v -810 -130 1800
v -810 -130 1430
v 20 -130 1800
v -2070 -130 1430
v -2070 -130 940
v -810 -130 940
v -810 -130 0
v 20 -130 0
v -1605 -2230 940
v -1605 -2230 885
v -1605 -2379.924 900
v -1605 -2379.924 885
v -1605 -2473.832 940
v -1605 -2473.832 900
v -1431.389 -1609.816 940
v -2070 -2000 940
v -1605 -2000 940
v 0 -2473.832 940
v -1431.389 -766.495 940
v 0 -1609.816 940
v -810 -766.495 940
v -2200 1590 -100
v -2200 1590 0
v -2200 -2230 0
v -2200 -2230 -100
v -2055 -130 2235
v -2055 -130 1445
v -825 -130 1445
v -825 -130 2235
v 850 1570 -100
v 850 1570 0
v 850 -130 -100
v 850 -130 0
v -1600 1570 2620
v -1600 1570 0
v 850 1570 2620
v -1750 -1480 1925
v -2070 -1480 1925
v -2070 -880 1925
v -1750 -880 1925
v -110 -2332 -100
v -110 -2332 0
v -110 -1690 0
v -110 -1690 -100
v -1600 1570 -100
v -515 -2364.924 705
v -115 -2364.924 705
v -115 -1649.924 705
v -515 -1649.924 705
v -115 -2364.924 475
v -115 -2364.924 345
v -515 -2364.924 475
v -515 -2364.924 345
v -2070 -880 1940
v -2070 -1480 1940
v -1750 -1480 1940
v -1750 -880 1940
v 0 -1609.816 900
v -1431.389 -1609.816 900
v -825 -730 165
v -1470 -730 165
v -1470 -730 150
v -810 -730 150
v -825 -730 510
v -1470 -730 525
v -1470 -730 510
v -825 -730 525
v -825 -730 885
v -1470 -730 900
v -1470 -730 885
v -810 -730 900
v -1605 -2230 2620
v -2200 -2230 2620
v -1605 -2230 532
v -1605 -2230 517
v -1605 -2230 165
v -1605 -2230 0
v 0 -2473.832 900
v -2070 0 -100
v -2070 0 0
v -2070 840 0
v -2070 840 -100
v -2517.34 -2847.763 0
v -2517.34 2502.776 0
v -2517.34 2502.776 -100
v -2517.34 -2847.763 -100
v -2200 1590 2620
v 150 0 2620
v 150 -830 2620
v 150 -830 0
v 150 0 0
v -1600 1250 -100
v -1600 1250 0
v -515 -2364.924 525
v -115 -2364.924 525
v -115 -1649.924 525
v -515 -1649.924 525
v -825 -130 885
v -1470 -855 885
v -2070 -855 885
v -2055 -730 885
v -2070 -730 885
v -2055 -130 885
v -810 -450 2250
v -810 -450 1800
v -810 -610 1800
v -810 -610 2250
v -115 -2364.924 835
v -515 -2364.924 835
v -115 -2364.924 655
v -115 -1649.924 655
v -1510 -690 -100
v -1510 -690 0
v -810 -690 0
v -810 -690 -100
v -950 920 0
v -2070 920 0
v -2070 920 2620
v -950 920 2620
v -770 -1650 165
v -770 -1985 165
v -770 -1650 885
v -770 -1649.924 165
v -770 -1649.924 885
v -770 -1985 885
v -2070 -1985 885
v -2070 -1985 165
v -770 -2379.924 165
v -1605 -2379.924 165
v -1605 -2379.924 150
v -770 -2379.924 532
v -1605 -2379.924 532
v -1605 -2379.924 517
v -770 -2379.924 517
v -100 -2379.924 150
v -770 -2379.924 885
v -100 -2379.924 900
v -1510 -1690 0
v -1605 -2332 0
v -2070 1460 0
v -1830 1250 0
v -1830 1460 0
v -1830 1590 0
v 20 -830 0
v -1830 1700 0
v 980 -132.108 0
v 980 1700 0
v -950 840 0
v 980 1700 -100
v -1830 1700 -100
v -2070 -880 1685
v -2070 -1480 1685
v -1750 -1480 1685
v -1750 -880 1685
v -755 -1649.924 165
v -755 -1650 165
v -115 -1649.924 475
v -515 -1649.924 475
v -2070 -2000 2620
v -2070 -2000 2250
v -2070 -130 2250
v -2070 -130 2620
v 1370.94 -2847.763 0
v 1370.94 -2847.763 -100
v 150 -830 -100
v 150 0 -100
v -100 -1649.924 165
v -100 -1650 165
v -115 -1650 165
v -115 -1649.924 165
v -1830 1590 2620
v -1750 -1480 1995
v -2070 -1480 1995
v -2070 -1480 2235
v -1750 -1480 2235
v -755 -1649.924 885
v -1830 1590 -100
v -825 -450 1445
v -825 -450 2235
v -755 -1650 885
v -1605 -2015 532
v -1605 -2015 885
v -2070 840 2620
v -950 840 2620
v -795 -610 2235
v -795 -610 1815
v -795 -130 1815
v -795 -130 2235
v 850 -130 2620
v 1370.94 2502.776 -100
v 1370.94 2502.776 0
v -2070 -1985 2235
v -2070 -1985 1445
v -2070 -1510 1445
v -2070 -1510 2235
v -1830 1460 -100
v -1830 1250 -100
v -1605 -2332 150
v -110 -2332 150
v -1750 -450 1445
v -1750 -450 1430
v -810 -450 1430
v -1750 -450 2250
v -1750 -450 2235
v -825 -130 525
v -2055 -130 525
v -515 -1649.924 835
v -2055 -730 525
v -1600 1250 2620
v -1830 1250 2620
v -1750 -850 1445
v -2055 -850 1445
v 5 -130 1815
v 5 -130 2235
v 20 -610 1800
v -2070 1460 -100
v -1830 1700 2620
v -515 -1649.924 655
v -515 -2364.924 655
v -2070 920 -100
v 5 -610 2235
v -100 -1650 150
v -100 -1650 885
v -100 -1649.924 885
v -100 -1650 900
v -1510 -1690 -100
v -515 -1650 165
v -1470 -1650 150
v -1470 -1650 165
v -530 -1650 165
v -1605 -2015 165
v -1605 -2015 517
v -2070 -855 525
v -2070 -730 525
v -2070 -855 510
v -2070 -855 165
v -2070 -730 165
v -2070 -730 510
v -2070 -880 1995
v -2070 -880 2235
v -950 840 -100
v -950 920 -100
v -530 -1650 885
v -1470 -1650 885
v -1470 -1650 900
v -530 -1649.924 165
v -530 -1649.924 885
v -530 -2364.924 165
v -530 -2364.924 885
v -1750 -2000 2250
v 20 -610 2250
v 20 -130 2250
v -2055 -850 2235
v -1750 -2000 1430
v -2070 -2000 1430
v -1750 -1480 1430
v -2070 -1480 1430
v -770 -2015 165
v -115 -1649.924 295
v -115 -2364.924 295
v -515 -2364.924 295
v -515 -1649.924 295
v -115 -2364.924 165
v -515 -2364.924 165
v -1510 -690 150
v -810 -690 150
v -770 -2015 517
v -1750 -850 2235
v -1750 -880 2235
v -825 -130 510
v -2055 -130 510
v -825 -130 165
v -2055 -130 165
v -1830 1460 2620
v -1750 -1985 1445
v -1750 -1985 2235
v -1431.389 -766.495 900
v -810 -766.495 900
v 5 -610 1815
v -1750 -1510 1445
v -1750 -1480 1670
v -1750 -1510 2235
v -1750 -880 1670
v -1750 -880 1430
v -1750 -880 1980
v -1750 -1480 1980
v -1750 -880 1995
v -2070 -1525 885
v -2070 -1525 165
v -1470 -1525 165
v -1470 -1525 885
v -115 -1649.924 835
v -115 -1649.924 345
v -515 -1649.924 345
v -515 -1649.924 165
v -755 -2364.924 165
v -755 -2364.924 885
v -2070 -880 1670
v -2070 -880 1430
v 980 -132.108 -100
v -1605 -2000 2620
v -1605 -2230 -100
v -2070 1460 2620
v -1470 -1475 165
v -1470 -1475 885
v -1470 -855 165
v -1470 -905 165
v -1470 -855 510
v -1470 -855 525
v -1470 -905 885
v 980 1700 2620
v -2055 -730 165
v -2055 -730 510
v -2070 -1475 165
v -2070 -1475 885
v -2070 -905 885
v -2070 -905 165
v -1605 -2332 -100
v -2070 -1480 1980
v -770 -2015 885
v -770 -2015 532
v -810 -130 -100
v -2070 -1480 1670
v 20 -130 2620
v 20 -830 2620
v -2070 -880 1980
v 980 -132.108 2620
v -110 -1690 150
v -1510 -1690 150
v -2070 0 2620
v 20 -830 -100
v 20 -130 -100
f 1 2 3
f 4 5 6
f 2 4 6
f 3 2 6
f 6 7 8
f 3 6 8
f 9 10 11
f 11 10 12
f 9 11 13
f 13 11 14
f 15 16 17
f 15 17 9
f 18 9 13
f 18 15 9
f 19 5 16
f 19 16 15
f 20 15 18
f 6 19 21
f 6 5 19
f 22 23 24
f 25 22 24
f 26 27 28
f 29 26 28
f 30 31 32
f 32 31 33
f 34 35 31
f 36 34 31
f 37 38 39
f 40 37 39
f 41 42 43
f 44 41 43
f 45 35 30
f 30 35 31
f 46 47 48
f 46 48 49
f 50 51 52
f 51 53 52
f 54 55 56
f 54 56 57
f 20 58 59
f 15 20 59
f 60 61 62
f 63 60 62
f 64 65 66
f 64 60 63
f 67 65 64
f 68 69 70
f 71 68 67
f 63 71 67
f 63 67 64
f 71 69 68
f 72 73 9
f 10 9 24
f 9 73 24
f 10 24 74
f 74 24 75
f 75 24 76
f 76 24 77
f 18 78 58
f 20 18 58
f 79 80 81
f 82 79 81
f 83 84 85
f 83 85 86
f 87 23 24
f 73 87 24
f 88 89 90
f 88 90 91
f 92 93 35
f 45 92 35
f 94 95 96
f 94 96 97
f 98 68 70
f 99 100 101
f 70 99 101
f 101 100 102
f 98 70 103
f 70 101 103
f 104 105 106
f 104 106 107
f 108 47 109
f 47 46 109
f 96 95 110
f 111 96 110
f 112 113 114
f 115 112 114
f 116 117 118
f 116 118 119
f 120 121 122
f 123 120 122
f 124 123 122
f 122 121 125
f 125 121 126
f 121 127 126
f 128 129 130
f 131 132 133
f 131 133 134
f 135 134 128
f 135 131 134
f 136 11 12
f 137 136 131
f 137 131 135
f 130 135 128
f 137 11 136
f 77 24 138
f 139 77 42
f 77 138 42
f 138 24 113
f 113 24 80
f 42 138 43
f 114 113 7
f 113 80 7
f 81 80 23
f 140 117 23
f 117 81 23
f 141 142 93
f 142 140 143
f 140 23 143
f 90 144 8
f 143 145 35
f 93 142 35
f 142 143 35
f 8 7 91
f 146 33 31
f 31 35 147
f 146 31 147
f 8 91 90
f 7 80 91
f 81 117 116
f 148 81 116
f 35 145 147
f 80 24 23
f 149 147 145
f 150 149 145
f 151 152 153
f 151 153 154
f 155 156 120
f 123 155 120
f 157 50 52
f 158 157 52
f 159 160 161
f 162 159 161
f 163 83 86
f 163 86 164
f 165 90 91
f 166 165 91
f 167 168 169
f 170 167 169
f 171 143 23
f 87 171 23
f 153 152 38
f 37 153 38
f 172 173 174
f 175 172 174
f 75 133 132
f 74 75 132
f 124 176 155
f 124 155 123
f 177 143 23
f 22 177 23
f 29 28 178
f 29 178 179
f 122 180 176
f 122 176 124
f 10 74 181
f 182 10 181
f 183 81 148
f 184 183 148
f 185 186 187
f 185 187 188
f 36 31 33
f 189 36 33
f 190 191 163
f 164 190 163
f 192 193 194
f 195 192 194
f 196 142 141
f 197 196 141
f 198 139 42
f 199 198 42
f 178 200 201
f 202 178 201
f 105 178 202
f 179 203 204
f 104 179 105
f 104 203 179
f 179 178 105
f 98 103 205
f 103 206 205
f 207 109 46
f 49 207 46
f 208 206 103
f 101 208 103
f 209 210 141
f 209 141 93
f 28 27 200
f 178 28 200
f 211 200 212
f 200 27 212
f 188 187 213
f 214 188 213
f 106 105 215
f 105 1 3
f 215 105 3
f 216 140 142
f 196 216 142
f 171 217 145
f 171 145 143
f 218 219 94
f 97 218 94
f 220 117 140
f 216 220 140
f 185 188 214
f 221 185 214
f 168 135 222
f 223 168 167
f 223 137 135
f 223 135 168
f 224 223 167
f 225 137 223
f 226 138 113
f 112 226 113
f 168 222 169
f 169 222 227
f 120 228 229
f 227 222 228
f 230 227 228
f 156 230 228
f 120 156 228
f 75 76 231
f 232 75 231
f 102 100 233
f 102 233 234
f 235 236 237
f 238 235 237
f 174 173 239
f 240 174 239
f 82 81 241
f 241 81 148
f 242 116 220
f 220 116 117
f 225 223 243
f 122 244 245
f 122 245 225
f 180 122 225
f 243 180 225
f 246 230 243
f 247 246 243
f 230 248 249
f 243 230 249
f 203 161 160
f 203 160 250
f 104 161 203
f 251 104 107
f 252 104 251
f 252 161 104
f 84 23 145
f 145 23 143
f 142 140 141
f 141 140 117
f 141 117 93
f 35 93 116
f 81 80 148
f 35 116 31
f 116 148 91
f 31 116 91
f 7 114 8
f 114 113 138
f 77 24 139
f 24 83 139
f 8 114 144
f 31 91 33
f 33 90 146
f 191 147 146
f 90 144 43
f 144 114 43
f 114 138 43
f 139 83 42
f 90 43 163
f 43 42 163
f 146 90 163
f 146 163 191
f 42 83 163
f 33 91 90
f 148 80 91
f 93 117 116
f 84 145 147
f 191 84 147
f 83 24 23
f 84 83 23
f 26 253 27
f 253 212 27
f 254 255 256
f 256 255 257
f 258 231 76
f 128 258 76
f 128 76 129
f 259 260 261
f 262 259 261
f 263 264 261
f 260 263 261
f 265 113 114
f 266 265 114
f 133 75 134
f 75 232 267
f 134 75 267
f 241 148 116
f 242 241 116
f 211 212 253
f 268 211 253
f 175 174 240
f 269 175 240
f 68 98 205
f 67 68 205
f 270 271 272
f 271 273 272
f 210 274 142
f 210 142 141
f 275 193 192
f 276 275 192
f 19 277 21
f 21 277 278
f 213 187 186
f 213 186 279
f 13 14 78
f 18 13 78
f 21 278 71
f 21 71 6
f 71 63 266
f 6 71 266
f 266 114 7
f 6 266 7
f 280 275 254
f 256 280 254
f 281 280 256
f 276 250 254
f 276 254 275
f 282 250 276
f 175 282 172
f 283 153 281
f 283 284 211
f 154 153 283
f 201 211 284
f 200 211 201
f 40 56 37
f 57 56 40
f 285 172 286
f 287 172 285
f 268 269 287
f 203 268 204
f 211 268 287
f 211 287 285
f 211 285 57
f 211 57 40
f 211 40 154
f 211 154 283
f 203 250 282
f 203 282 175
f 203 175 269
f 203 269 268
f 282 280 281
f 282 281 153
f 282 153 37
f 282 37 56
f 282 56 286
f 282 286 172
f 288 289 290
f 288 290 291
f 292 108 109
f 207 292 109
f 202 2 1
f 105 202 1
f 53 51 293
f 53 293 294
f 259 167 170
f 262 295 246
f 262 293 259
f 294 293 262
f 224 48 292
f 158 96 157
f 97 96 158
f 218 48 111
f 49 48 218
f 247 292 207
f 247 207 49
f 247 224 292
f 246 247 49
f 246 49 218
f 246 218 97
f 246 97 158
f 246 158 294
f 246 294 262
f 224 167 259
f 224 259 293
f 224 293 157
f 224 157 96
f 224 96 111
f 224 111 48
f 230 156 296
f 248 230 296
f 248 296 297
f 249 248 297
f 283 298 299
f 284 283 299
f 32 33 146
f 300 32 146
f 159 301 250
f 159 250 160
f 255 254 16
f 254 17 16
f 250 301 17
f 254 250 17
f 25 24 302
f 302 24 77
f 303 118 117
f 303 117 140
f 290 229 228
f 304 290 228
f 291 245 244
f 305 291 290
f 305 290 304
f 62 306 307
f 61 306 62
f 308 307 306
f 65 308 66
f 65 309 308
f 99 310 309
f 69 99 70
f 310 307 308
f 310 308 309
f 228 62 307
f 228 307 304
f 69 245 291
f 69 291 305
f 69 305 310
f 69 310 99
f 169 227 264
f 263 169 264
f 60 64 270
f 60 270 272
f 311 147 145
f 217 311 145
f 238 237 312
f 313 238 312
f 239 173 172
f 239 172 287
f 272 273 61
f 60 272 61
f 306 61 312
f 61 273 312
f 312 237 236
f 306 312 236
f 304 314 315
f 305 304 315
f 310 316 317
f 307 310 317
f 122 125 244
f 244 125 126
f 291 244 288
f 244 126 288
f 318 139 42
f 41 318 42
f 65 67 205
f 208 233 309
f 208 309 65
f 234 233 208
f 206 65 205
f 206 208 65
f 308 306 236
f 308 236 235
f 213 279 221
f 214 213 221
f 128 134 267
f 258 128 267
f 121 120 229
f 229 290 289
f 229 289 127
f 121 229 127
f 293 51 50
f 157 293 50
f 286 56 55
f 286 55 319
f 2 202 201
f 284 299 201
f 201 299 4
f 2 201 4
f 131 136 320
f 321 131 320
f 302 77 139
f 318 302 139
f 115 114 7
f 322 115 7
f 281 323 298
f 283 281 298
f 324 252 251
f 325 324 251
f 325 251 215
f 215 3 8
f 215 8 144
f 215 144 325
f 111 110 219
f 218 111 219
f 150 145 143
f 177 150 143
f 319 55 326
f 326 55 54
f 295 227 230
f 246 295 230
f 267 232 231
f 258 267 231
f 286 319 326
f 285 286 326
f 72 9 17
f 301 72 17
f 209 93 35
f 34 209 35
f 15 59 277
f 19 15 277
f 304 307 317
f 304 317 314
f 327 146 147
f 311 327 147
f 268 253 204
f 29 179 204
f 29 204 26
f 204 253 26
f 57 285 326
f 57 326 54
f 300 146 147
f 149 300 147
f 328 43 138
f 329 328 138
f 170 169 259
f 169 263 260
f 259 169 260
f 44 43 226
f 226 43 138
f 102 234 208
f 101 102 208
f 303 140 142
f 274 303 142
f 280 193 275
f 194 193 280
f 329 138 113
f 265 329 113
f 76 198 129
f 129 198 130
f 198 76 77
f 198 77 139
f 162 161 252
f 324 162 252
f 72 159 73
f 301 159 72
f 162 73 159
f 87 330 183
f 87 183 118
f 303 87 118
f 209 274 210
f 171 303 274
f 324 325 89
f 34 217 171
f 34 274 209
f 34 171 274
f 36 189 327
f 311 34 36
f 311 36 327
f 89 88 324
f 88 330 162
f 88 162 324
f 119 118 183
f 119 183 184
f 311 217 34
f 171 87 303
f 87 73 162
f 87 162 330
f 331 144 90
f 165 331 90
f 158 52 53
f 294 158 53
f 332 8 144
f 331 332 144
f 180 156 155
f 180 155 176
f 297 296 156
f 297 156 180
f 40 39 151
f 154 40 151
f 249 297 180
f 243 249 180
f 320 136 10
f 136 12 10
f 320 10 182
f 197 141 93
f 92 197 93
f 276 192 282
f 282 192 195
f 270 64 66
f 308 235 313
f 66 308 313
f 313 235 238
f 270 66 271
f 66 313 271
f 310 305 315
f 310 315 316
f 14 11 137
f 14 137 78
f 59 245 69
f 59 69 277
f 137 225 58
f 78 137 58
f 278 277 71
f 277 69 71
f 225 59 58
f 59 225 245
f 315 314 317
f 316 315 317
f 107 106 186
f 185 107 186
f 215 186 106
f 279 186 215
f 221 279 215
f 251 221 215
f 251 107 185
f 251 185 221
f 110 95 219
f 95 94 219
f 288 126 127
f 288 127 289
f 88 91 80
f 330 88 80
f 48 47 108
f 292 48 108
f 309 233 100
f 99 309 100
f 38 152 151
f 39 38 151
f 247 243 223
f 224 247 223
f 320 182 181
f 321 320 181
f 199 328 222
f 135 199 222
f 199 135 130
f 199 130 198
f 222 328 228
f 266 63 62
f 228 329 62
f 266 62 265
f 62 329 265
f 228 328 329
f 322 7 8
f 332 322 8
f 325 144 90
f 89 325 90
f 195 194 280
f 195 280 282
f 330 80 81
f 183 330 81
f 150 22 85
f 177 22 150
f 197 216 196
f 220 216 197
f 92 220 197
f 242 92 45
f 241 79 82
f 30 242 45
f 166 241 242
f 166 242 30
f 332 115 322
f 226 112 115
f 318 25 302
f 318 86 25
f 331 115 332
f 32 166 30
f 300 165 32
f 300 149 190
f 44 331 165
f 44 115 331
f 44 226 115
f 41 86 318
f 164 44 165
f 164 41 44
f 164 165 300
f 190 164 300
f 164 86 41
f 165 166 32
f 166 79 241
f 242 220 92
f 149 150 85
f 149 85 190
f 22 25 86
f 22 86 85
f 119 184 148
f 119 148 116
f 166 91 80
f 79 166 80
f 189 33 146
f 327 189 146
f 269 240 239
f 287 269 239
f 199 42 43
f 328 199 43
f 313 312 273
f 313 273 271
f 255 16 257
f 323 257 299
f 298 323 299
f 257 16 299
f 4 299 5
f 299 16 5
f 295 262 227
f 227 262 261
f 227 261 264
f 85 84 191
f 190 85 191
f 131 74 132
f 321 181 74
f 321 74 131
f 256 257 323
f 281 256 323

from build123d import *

# Parameters (mm, degrees)
F0_W      = 1120
F0_H      = 80
F1_DEPTH  = 2620
F2_W      = 1260
F2_H      = 820
F2_W_2    = 1230
F2_H_2    = 790
F3_DEPTH  = 320
F5_DEPTH  = 320
F6_DEPTH  = 15
F7_W      = 600
F7_H      = 15
F8_DEPTH  = 320
F9_W      = 505
F9_H      = 820
F9_W_2    = 475
F9_H_2    = 790
F10_DEPTH = 320
F11_DEPTH = 150
F12_W     = 1260
F12_H     = 750
F12_W_2   = 779.1761636734
F12_H_2   = 15
F12_W_3   = 450.8238363266
F13_DEPTH = 600
F14_W     = 50
F14_H     = 720
F14_W_2   = 125
F14_H_2   = 15
F15_DEPTH = 600
F16_W     = 830
F16_H     = 450
F16_W_2   = 800
F16_H_2   = 420
F17_DEPTH = 480
F18_W     = 3888.2797956467
F18_H     = 5350.5387306213
F19_DEPTH = 100
F21_DEPTH = 700
F22_W     = 149.9238204956
F22_H     = 15
F23_DEPTH = 835
F24_W     = 15
F24_H     = 720
F25_DEPTH = 670
F26_W     = 400
F26_H     = 50
F26_W_2   = 15
F26_H_2   = 720
F27_DEPTH = 715
F29_DEPTH = 40
F30_W     = 835
F30_H     = 15
F31_DEPTH = 364.9238204956


# Not quite as in the source:
# - a feature names something its author has since deleted; it is built from what else it names


with BuildPart() as f1:
    # F0 (on Top) → F1 (new body)
    with BuildSketch(Plane.XY):
        Polygon((-2070, 0), (-2070, -130), (-810, -130), (20, -130), (20, -830), (150, -830), (150, 0), align=None)
        Polygon((-1830, 1460), (-1830, 1590), (-2200, 1590), (-2200, -2000), (-2070, -2000), (-2070, -130), (-2070, 0), (-2070, 840), (-2070, 920), (-2070, 1460), align=None)
        Polygon((980, 1700), (-1600, 1700), (-1600, 1570), (850, 1570), (850, -130), (980, -132.1084350348), align=None)
        Polygon((-1600, 1570), (-1600, 1700), (-1830, 1700), (-1830, 1590), (-1830, 1460), (-1830, 1250), (-1600, 1250), align=None)
        Polygon((-2070, -2000), (-2200, -2000), (-2200, -2230), (-1605, -2230), (-1605, -2000), align=None)
        with Locations((-1510, 880)):
            Rectangle(F0_W, F0_H)
    extrude(amount=F1_DEPTH)

    # F2 (on face) → F3 (join)
    with BuildSketch(Plane.XZ.offset(130)):
        with Locations((-1440, 1840)):
            Rectangle(F2_W, F2_H)
        with Locations((-1440, 1840)):
            Rectangle(F2_W_2, F2_H_2, mode=Mode.SUBTRACT)
    extrude(amount=F3_DEPTH)

    # F4 (on face) → F5 (join)
    with BuildSketch(Plane.YZ.offset(-2070)):
        Polygon((-450, 2235), (-450, 2250), (-865, 2250), (-865, 1430), (-450, 1430), (-450, 1445), (-630, 1445), (-645, 1445), (-850, 1445), (-850, 2235), (-645, 2235), (-630, 2235), align=None)
    extrude(amount=F5_DEPTH)

    # F6 (add): a face of the model
    f6_faces = [f1.faces().sort_by_distance(p)[0] for p in [
        (-2070, -650, 1840),
    ]]
    extrude(f6_faces, amount=F6_DEPTH)

    # F7 (on face) → F8 (join)
    with BuildSketch(Plane.YZ.offset(-2070)):
        Polygon((-865, 1430), (-865, 2250), (-1495, 2250), (-1495, 1430), (-1480, 1430), (-1480, 1670), (-1480, 1685), (-1480, 1925), (-1480, 1940), (-1480, 1980), (-1480, 1995), (-1480, 2235), (-880, 2235), (-880, 1995), (-880, 1980), (-880, 1940), (-880, 1925), (-880, 1685), (-880, 1670), (-880, 1430), align=None)
        with Locations((-1180, 1987.5)):
            Rectangle(F7_W, F7_H)
        with Locations((-1180, 1932.5)):
            Rectangle(F7_W, F7_H)
        with Locations((-1180, 1677.5)):
            Rectangle(F7_W, F7_H)
    extrude(amount=F8_DEPTH)

    # F9 (on face) → F10 (join)
    with BuildSketch(Plane.YZ.offset(-2070)):
        with Locations((-1747.5, 1840)):
            Rectangle(F9_W, F9_H)
        with Locations((-1747.5, 1840)):
            Rectangle(F9_W_2, F9_H_2, mode=Mode.SUBTRACT)
    extrude(amount=F10_DEPTH)

    # F0 (on Top) → F11 (join)
    with BuildSketch(Plane.XY):
        Polygon((-2070, -130), (-2070, -2000), (-1605, -2000), (-1605, -2230), (-1605, -2332), (-110, -2332), (-110, -1690), (-1510, -1690), (-1510, -690), (-810, -690), (-810, -130), align=None)
    extrude(amount=F11_DEPTH)

    # F12 (on face) → F13 (join)
    with BuildSketch(Plane.XZ.offset(130)):
        with Locations((-1440, 525)):
            Rectangle(F12_W, F12_H)
        Polygon((-825, 510), (-825, 165), (-2055, 165), (-2055, 510), (-2055, 525), (-2055, 885), (-825, 885), (-825, 525), align=None, mode=Mode.SUBTRACT)
        with Locations((-1214.5880818367, 517.5)):
            Rectangle(F12_W_2, F12_H_2)
        with Locations((-1829.5880818367, 517.5)):
            Rectangle(F12_W_3, F12_H_2)
    extrude(amount=F13_DEPTH)

    # F14 (on face) → F15 (join)
    with BuildSketch(Plane.YZ.offset(-2070)):
        with Locations((-1500, 525)):
            Rectangle(F14_W, F14_H)
        Polygon((-905, 885), (-905, 165), (-855, 165), (-855, 510), (-855, 525), (-855, 885), align=None)
        with Locations((-792.5, 517.5)):
            Rectangle(F14_W_2, F14_H_2)
        Polygon((-1475, 165), (-1525, 165), (-1985, 165), (-1985, 885), (-1525, 885), (-1475, 885), (-905, 885), (-855, 885), (-730, 885), (-730, 900), (-2000, 900), (-2000, 150), (-730, 150), (-730, 165), (-855, 165), (-905, 165), align=None)
    extrude(amount=F15_DEPTH)

    # F16 (on face) → F17 (join)
    with BuildSketch(Plane.XZ.offset(130)):
        with Locations((-395, 2025)):
            Rectangle(F16_W, F16_H)
        with Locations((-395, 2025)):
            Rectangle(F16_W_2, F16_H_2, mode=Mode.SUBTRACT)
    extrude(amount=F17_DEPTH)

    # F20 (on face) → F21 (join)
    with BuildSketch(Plane.YZ.offset(-1470)):
        Polygon((-1690, 150), (-1650, 150), (-1650, 165), (-1985, 165), (-1985, 885), (-1650, 885), (-1650, 900), (-2000, 900), (-2000, 150), align=None)
    extrude(amount=F21_DEPTH)

    # F22 (on face) → F23 (join)
    with BuildSketch(Plane.YZ.offset(-1605)):
        Polygon((-2230, 165), (-2230, 150), (-2000, 150), (-2000, 900), (-2230, 900), (-2230, 885), (-2015, 885), (-2015, 165), align=None)
        with Locations((-2304.9619102478, 892.5)):
            Rectangle(F22_W, F22_H)
        with Locations((-2304.9619102478, 157.5)):
            Rectangle(F22_W, F22_H)
    extrude(amount=F23_DEPTH)

    # F24 (on face) → F25 (join)
    with BuildSketch(Plane.YZ.offset(-770)):
        with Locations((-2372.4238204956, 525)):
            Rectangle(F24_W, F24_H)
        Polygon((-1690, 150), (-1650, 150), (-1650, 165), (-1985, 165), (-2015, 165), (-2364.9238204956, 165), (-2379.9238204956, 165), (-2379.9238204956, 150), (-2332, 150), align=None)
        Polygon((-2015, 885), (-1985, 885), (-1650, 885), (-1650, 900), (-2379.9238204956, 900), (-2379.9238204956, 885), (-2364.9238204956, 885), align=None)
    extrude(amount=F25_DEPTH)

    # F26 (on face) → F27 (join)
    with BuildSketch(Plane(origin=(0, -2364.9238204956, 0), x_dir=(-1, 0, 0), z_dir=(0, 1, 0))):
        Polygon((515, 295), (515, 165), (530, 165), (530, 885), (515, 885), (515, 835), (515, 705), (515, 655), (515, 525), (515, 475), (515, 345), align=None)
        with Locations((315, 860)):
            Rectangle(F26_W, F26_H)
        with Locations((315, 680)):
            Rectangle(F26_W, F26_H)
        with Locations((315, 500)):
            Rectangle(F26_W, F26_H)
        with Locations((762.5, 525)):
            Rectangle(F26_W_2, F26_H_2)
        with Locations((315, 320)):
            Rectangle(F26_W, F26_H)
        Polygon((100, 885), (100, 165), (115, 165), (115, 295), (115, 345), (115, 475), (115, 525), (115, 655), (115, 705), (115, 835), (115, 885), align=None)
    extrude(amount=F27_DEPTH)

    # F28 (on face) → F29 (join)
    with BuildSketch(Plane.XY.offset(900)):
        Polygon((-2070, -2000), (-1605, -2000), (-1605, -2230), (-1605, -2379.9238204956), (-100, -2379.9238204956), (-100, -1650), (-1470, -1650), (-1470, -730), (-810, -730), (-810, -130), (-2070, -130), align=None)
        Polygon((-100, -2379.9238204956), (-1605, -2379.9238204956), (-1605, -2473.8321304321), (0, -2473.8321304321), (0, -1609.8160743713), (-1431.3893318176, -1609.8160743713), (-1431.3893318176, -766.4950489998), (-810, -766.4950489998), (-810, -730), (-1470, -730), (-1470, -1650), (-100, -1650), align=None)
    extrude(amount=F29_DEPTH)

    # F30 (on face) → F31 (join, through all)
    with BuildSketch(Plane.XZ.offset(2015)):
        with Locations((-1187.5, 524.5)):
            Rectangle(F30_W, F30_H)
    extrude(amount=F31_DEPTH)


with BuildPart() as f19:
    # F18 (on face) → F19 (new body)
    with BuildSketch(Plane(origin=(0, 0, 0), x_dir=(1, 0, 0), z_dir=(0, 0, -1))):
        with Locations((-573.2000470161, 172.4932193756)):
            Rectangle(F18_W, F18_H)
        Polygon((-810, 130), (20, 130), (20, 830), (150, 830), (150, 0), (-2070, 0), (-2070, -840), (-950, -840), (-950, -920), (-2070, -920), (-2070, -1460), (-1830, -1460), (-1830, -1250), (-1600, -1250), (-1600, -1570), (850, -1570), (850, 130), (980, 132.1084350348), (980, -1700), (-1830, -1700), (-1830, -1590), (-2200, -1590), (-2200, 2230), (-1605, 2230), (-1605, 2332), (-110, 2332), (-110, 1690), (-1510, 1690), (-1510, 690), (-810, 690), align=None, mode=Mode.SUBTRACT)
    extrude(amount=F19_DEPTH)


solid = Compound([f1.part, f19.part])
